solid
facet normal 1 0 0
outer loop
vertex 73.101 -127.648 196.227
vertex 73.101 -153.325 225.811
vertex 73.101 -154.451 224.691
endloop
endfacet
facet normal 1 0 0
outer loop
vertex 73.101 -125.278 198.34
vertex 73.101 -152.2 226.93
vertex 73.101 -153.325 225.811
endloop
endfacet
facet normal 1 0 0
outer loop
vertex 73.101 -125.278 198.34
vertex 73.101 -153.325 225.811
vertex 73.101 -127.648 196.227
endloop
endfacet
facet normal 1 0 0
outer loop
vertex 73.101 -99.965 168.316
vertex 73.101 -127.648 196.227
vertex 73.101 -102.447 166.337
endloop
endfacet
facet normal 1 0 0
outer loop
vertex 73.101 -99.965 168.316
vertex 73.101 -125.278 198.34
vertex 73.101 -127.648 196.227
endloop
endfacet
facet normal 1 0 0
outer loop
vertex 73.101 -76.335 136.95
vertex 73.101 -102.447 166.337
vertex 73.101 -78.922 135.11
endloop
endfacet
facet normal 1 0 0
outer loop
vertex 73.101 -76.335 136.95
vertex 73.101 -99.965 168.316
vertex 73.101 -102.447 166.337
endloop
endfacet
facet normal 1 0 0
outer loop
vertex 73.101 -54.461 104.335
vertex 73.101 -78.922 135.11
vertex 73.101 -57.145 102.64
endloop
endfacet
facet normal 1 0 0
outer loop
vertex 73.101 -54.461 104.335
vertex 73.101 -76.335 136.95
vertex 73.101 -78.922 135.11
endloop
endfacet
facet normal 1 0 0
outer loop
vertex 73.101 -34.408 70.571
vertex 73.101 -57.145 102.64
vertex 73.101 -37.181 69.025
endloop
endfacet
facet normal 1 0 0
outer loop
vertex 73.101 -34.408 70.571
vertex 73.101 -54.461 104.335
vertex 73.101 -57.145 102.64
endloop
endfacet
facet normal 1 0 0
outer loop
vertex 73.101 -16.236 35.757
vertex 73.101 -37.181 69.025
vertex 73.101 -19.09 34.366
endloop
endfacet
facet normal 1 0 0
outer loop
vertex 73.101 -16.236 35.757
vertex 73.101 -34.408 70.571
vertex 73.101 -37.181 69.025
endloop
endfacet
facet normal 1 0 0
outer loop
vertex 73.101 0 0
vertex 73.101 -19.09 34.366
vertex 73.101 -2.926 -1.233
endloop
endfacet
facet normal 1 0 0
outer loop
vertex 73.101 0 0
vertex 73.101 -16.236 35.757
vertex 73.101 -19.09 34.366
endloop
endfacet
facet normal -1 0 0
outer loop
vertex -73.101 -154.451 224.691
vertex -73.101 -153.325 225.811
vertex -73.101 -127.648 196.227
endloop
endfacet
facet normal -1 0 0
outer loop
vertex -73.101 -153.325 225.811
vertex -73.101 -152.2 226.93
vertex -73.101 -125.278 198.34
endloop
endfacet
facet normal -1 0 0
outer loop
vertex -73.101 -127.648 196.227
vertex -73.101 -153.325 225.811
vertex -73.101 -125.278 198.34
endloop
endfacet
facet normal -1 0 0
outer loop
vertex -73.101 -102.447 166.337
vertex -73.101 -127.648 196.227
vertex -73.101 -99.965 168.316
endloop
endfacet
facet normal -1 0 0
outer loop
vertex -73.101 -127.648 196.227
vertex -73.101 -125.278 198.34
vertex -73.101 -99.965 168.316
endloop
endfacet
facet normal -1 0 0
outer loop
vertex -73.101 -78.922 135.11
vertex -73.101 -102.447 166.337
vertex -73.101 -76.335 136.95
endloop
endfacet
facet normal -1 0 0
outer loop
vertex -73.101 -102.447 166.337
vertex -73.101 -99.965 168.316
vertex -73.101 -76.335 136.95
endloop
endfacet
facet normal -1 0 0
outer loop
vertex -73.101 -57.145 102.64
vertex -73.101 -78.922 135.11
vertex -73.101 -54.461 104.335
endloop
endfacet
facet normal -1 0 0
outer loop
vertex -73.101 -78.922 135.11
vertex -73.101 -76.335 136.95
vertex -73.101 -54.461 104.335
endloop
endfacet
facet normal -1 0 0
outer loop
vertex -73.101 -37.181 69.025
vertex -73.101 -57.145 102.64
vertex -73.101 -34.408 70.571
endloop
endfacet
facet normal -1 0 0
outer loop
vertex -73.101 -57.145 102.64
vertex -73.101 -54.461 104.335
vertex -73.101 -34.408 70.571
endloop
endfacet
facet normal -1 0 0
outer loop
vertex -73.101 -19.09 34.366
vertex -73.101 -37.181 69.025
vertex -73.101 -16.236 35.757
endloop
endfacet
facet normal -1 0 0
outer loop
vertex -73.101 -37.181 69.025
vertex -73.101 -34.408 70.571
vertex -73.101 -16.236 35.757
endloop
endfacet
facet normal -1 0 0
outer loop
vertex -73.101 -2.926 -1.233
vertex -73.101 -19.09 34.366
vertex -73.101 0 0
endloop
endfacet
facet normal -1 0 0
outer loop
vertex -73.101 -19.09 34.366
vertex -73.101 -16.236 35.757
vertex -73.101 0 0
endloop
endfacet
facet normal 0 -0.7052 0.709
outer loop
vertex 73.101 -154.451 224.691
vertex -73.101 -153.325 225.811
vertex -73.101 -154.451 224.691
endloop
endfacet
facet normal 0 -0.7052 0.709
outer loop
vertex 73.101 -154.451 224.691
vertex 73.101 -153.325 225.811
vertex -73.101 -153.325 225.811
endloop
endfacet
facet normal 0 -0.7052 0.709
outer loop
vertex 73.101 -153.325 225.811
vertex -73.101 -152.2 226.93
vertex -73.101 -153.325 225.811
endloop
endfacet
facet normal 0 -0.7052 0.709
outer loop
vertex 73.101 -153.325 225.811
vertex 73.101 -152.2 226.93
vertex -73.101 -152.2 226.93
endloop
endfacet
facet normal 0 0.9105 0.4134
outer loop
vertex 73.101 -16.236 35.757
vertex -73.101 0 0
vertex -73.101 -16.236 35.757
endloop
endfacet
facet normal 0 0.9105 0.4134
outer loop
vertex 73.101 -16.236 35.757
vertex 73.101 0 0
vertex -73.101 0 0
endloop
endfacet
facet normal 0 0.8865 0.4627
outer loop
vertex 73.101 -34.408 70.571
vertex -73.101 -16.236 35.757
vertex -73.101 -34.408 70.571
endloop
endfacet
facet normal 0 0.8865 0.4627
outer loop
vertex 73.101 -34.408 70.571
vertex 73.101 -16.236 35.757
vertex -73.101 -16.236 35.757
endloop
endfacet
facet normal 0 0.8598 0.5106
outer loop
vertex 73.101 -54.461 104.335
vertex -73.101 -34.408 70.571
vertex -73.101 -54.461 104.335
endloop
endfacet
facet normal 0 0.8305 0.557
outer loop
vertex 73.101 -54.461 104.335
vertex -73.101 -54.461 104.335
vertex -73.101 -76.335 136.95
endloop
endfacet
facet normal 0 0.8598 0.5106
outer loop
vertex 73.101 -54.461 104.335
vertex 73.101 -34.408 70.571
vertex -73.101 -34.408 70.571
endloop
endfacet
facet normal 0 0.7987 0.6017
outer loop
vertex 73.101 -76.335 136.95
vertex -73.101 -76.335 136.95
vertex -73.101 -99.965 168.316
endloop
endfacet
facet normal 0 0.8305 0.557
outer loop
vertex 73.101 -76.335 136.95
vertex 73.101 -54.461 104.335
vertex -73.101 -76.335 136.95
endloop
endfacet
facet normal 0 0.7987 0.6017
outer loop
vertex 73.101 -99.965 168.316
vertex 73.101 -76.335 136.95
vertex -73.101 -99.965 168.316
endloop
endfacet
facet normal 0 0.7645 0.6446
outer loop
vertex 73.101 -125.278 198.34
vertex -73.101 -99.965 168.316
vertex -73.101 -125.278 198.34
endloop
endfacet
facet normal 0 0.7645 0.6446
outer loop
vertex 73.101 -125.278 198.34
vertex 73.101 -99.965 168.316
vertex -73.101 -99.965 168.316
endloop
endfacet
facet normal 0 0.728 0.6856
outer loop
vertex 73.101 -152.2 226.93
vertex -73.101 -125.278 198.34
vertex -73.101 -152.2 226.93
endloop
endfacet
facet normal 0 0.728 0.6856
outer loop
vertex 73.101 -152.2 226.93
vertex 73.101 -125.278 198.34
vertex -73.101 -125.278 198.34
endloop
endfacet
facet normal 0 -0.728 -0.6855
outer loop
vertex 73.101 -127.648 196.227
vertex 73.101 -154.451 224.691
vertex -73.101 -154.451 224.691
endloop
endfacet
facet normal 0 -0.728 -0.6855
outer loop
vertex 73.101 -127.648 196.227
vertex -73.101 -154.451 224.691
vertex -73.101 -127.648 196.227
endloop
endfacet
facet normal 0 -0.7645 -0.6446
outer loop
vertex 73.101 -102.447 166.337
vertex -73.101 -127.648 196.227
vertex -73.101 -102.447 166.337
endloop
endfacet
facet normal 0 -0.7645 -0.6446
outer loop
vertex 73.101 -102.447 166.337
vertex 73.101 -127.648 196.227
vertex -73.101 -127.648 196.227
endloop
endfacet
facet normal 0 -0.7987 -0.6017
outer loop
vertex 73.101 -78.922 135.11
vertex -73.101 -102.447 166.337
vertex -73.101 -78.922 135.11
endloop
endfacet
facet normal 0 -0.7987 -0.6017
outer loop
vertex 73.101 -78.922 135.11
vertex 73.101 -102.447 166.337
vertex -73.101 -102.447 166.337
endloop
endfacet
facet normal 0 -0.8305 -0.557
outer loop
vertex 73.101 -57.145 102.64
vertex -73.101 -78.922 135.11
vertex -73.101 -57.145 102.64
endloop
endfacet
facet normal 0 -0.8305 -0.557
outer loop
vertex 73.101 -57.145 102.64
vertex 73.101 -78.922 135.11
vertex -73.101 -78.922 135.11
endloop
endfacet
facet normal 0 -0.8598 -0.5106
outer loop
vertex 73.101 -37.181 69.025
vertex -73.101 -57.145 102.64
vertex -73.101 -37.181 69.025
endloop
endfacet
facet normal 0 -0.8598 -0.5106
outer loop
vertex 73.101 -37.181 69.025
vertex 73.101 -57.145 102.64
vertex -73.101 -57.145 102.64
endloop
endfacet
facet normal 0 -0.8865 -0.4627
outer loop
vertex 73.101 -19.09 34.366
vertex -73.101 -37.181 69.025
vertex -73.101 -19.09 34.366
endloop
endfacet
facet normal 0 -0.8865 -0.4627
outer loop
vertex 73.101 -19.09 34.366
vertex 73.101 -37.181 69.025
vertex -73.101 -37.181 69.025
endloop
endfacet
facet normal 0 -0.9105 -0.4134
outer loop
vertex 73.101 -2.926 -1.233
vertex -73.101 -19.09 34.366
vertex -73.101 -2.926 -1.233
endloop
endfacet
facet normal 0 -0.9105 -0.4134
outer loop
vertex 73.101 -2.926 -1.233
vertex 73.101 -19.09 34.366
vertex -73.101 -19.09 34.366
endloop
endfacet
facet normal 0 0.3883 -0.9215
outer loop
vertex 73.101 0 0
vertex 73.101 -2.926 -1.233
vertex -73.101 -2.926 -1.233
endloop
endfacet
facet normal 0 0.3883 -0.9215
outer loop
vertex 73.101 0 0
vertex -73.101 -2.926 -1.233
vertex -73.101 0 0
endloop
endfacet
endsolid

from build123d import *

# Parameters (mm, degrees)
BOSS_EXTRUDE1_DEPTH = 73.1012


with BuildPart() as part:
    # Sketch1 → Boss-Extrude1 (new, symmetric)
    with BuildSketch(Plane(origin=(0, 0, 0), x_dir=(0, 0, -1), z_dir=(1, 0, 0))):
        with BuildLine():
            Line((-225.810623786, -153.325114244), (-224.691047691, -154.450594417))
            ThreePointArc((-224.691047691, -154.450594417), (-119.024013128, -67.811130366), (1.233217804, -2.925713414))
            Line((1.233217804, -2.925713414), (0.616608902, -1.462856707))
            ThreePointArc((0.616608902, -1.462856707), (-119.908343561, -66.492754113), (-225.810623786, -153.325114244))
        make_face()
        with BuildLine():
            Line((-226.93019988, -152.199634071), (-225.810623786, -153.325114244))
            ThreePointArc((-225.810623786, -153.325114244), (-119.908343561, -66.492754113), (0.616608902, -1.462856707))
            Line((0.616608902, -1.462856707), (0, 0))
            ThreePointArc((0, 0), (-120.792673993, -65.17437786), (-226.93019988, -152.199634071))
        make_face()
    extrude(amount=BOSS_EXTRUDE1_DEPTH, both=True)


solid = part.part
